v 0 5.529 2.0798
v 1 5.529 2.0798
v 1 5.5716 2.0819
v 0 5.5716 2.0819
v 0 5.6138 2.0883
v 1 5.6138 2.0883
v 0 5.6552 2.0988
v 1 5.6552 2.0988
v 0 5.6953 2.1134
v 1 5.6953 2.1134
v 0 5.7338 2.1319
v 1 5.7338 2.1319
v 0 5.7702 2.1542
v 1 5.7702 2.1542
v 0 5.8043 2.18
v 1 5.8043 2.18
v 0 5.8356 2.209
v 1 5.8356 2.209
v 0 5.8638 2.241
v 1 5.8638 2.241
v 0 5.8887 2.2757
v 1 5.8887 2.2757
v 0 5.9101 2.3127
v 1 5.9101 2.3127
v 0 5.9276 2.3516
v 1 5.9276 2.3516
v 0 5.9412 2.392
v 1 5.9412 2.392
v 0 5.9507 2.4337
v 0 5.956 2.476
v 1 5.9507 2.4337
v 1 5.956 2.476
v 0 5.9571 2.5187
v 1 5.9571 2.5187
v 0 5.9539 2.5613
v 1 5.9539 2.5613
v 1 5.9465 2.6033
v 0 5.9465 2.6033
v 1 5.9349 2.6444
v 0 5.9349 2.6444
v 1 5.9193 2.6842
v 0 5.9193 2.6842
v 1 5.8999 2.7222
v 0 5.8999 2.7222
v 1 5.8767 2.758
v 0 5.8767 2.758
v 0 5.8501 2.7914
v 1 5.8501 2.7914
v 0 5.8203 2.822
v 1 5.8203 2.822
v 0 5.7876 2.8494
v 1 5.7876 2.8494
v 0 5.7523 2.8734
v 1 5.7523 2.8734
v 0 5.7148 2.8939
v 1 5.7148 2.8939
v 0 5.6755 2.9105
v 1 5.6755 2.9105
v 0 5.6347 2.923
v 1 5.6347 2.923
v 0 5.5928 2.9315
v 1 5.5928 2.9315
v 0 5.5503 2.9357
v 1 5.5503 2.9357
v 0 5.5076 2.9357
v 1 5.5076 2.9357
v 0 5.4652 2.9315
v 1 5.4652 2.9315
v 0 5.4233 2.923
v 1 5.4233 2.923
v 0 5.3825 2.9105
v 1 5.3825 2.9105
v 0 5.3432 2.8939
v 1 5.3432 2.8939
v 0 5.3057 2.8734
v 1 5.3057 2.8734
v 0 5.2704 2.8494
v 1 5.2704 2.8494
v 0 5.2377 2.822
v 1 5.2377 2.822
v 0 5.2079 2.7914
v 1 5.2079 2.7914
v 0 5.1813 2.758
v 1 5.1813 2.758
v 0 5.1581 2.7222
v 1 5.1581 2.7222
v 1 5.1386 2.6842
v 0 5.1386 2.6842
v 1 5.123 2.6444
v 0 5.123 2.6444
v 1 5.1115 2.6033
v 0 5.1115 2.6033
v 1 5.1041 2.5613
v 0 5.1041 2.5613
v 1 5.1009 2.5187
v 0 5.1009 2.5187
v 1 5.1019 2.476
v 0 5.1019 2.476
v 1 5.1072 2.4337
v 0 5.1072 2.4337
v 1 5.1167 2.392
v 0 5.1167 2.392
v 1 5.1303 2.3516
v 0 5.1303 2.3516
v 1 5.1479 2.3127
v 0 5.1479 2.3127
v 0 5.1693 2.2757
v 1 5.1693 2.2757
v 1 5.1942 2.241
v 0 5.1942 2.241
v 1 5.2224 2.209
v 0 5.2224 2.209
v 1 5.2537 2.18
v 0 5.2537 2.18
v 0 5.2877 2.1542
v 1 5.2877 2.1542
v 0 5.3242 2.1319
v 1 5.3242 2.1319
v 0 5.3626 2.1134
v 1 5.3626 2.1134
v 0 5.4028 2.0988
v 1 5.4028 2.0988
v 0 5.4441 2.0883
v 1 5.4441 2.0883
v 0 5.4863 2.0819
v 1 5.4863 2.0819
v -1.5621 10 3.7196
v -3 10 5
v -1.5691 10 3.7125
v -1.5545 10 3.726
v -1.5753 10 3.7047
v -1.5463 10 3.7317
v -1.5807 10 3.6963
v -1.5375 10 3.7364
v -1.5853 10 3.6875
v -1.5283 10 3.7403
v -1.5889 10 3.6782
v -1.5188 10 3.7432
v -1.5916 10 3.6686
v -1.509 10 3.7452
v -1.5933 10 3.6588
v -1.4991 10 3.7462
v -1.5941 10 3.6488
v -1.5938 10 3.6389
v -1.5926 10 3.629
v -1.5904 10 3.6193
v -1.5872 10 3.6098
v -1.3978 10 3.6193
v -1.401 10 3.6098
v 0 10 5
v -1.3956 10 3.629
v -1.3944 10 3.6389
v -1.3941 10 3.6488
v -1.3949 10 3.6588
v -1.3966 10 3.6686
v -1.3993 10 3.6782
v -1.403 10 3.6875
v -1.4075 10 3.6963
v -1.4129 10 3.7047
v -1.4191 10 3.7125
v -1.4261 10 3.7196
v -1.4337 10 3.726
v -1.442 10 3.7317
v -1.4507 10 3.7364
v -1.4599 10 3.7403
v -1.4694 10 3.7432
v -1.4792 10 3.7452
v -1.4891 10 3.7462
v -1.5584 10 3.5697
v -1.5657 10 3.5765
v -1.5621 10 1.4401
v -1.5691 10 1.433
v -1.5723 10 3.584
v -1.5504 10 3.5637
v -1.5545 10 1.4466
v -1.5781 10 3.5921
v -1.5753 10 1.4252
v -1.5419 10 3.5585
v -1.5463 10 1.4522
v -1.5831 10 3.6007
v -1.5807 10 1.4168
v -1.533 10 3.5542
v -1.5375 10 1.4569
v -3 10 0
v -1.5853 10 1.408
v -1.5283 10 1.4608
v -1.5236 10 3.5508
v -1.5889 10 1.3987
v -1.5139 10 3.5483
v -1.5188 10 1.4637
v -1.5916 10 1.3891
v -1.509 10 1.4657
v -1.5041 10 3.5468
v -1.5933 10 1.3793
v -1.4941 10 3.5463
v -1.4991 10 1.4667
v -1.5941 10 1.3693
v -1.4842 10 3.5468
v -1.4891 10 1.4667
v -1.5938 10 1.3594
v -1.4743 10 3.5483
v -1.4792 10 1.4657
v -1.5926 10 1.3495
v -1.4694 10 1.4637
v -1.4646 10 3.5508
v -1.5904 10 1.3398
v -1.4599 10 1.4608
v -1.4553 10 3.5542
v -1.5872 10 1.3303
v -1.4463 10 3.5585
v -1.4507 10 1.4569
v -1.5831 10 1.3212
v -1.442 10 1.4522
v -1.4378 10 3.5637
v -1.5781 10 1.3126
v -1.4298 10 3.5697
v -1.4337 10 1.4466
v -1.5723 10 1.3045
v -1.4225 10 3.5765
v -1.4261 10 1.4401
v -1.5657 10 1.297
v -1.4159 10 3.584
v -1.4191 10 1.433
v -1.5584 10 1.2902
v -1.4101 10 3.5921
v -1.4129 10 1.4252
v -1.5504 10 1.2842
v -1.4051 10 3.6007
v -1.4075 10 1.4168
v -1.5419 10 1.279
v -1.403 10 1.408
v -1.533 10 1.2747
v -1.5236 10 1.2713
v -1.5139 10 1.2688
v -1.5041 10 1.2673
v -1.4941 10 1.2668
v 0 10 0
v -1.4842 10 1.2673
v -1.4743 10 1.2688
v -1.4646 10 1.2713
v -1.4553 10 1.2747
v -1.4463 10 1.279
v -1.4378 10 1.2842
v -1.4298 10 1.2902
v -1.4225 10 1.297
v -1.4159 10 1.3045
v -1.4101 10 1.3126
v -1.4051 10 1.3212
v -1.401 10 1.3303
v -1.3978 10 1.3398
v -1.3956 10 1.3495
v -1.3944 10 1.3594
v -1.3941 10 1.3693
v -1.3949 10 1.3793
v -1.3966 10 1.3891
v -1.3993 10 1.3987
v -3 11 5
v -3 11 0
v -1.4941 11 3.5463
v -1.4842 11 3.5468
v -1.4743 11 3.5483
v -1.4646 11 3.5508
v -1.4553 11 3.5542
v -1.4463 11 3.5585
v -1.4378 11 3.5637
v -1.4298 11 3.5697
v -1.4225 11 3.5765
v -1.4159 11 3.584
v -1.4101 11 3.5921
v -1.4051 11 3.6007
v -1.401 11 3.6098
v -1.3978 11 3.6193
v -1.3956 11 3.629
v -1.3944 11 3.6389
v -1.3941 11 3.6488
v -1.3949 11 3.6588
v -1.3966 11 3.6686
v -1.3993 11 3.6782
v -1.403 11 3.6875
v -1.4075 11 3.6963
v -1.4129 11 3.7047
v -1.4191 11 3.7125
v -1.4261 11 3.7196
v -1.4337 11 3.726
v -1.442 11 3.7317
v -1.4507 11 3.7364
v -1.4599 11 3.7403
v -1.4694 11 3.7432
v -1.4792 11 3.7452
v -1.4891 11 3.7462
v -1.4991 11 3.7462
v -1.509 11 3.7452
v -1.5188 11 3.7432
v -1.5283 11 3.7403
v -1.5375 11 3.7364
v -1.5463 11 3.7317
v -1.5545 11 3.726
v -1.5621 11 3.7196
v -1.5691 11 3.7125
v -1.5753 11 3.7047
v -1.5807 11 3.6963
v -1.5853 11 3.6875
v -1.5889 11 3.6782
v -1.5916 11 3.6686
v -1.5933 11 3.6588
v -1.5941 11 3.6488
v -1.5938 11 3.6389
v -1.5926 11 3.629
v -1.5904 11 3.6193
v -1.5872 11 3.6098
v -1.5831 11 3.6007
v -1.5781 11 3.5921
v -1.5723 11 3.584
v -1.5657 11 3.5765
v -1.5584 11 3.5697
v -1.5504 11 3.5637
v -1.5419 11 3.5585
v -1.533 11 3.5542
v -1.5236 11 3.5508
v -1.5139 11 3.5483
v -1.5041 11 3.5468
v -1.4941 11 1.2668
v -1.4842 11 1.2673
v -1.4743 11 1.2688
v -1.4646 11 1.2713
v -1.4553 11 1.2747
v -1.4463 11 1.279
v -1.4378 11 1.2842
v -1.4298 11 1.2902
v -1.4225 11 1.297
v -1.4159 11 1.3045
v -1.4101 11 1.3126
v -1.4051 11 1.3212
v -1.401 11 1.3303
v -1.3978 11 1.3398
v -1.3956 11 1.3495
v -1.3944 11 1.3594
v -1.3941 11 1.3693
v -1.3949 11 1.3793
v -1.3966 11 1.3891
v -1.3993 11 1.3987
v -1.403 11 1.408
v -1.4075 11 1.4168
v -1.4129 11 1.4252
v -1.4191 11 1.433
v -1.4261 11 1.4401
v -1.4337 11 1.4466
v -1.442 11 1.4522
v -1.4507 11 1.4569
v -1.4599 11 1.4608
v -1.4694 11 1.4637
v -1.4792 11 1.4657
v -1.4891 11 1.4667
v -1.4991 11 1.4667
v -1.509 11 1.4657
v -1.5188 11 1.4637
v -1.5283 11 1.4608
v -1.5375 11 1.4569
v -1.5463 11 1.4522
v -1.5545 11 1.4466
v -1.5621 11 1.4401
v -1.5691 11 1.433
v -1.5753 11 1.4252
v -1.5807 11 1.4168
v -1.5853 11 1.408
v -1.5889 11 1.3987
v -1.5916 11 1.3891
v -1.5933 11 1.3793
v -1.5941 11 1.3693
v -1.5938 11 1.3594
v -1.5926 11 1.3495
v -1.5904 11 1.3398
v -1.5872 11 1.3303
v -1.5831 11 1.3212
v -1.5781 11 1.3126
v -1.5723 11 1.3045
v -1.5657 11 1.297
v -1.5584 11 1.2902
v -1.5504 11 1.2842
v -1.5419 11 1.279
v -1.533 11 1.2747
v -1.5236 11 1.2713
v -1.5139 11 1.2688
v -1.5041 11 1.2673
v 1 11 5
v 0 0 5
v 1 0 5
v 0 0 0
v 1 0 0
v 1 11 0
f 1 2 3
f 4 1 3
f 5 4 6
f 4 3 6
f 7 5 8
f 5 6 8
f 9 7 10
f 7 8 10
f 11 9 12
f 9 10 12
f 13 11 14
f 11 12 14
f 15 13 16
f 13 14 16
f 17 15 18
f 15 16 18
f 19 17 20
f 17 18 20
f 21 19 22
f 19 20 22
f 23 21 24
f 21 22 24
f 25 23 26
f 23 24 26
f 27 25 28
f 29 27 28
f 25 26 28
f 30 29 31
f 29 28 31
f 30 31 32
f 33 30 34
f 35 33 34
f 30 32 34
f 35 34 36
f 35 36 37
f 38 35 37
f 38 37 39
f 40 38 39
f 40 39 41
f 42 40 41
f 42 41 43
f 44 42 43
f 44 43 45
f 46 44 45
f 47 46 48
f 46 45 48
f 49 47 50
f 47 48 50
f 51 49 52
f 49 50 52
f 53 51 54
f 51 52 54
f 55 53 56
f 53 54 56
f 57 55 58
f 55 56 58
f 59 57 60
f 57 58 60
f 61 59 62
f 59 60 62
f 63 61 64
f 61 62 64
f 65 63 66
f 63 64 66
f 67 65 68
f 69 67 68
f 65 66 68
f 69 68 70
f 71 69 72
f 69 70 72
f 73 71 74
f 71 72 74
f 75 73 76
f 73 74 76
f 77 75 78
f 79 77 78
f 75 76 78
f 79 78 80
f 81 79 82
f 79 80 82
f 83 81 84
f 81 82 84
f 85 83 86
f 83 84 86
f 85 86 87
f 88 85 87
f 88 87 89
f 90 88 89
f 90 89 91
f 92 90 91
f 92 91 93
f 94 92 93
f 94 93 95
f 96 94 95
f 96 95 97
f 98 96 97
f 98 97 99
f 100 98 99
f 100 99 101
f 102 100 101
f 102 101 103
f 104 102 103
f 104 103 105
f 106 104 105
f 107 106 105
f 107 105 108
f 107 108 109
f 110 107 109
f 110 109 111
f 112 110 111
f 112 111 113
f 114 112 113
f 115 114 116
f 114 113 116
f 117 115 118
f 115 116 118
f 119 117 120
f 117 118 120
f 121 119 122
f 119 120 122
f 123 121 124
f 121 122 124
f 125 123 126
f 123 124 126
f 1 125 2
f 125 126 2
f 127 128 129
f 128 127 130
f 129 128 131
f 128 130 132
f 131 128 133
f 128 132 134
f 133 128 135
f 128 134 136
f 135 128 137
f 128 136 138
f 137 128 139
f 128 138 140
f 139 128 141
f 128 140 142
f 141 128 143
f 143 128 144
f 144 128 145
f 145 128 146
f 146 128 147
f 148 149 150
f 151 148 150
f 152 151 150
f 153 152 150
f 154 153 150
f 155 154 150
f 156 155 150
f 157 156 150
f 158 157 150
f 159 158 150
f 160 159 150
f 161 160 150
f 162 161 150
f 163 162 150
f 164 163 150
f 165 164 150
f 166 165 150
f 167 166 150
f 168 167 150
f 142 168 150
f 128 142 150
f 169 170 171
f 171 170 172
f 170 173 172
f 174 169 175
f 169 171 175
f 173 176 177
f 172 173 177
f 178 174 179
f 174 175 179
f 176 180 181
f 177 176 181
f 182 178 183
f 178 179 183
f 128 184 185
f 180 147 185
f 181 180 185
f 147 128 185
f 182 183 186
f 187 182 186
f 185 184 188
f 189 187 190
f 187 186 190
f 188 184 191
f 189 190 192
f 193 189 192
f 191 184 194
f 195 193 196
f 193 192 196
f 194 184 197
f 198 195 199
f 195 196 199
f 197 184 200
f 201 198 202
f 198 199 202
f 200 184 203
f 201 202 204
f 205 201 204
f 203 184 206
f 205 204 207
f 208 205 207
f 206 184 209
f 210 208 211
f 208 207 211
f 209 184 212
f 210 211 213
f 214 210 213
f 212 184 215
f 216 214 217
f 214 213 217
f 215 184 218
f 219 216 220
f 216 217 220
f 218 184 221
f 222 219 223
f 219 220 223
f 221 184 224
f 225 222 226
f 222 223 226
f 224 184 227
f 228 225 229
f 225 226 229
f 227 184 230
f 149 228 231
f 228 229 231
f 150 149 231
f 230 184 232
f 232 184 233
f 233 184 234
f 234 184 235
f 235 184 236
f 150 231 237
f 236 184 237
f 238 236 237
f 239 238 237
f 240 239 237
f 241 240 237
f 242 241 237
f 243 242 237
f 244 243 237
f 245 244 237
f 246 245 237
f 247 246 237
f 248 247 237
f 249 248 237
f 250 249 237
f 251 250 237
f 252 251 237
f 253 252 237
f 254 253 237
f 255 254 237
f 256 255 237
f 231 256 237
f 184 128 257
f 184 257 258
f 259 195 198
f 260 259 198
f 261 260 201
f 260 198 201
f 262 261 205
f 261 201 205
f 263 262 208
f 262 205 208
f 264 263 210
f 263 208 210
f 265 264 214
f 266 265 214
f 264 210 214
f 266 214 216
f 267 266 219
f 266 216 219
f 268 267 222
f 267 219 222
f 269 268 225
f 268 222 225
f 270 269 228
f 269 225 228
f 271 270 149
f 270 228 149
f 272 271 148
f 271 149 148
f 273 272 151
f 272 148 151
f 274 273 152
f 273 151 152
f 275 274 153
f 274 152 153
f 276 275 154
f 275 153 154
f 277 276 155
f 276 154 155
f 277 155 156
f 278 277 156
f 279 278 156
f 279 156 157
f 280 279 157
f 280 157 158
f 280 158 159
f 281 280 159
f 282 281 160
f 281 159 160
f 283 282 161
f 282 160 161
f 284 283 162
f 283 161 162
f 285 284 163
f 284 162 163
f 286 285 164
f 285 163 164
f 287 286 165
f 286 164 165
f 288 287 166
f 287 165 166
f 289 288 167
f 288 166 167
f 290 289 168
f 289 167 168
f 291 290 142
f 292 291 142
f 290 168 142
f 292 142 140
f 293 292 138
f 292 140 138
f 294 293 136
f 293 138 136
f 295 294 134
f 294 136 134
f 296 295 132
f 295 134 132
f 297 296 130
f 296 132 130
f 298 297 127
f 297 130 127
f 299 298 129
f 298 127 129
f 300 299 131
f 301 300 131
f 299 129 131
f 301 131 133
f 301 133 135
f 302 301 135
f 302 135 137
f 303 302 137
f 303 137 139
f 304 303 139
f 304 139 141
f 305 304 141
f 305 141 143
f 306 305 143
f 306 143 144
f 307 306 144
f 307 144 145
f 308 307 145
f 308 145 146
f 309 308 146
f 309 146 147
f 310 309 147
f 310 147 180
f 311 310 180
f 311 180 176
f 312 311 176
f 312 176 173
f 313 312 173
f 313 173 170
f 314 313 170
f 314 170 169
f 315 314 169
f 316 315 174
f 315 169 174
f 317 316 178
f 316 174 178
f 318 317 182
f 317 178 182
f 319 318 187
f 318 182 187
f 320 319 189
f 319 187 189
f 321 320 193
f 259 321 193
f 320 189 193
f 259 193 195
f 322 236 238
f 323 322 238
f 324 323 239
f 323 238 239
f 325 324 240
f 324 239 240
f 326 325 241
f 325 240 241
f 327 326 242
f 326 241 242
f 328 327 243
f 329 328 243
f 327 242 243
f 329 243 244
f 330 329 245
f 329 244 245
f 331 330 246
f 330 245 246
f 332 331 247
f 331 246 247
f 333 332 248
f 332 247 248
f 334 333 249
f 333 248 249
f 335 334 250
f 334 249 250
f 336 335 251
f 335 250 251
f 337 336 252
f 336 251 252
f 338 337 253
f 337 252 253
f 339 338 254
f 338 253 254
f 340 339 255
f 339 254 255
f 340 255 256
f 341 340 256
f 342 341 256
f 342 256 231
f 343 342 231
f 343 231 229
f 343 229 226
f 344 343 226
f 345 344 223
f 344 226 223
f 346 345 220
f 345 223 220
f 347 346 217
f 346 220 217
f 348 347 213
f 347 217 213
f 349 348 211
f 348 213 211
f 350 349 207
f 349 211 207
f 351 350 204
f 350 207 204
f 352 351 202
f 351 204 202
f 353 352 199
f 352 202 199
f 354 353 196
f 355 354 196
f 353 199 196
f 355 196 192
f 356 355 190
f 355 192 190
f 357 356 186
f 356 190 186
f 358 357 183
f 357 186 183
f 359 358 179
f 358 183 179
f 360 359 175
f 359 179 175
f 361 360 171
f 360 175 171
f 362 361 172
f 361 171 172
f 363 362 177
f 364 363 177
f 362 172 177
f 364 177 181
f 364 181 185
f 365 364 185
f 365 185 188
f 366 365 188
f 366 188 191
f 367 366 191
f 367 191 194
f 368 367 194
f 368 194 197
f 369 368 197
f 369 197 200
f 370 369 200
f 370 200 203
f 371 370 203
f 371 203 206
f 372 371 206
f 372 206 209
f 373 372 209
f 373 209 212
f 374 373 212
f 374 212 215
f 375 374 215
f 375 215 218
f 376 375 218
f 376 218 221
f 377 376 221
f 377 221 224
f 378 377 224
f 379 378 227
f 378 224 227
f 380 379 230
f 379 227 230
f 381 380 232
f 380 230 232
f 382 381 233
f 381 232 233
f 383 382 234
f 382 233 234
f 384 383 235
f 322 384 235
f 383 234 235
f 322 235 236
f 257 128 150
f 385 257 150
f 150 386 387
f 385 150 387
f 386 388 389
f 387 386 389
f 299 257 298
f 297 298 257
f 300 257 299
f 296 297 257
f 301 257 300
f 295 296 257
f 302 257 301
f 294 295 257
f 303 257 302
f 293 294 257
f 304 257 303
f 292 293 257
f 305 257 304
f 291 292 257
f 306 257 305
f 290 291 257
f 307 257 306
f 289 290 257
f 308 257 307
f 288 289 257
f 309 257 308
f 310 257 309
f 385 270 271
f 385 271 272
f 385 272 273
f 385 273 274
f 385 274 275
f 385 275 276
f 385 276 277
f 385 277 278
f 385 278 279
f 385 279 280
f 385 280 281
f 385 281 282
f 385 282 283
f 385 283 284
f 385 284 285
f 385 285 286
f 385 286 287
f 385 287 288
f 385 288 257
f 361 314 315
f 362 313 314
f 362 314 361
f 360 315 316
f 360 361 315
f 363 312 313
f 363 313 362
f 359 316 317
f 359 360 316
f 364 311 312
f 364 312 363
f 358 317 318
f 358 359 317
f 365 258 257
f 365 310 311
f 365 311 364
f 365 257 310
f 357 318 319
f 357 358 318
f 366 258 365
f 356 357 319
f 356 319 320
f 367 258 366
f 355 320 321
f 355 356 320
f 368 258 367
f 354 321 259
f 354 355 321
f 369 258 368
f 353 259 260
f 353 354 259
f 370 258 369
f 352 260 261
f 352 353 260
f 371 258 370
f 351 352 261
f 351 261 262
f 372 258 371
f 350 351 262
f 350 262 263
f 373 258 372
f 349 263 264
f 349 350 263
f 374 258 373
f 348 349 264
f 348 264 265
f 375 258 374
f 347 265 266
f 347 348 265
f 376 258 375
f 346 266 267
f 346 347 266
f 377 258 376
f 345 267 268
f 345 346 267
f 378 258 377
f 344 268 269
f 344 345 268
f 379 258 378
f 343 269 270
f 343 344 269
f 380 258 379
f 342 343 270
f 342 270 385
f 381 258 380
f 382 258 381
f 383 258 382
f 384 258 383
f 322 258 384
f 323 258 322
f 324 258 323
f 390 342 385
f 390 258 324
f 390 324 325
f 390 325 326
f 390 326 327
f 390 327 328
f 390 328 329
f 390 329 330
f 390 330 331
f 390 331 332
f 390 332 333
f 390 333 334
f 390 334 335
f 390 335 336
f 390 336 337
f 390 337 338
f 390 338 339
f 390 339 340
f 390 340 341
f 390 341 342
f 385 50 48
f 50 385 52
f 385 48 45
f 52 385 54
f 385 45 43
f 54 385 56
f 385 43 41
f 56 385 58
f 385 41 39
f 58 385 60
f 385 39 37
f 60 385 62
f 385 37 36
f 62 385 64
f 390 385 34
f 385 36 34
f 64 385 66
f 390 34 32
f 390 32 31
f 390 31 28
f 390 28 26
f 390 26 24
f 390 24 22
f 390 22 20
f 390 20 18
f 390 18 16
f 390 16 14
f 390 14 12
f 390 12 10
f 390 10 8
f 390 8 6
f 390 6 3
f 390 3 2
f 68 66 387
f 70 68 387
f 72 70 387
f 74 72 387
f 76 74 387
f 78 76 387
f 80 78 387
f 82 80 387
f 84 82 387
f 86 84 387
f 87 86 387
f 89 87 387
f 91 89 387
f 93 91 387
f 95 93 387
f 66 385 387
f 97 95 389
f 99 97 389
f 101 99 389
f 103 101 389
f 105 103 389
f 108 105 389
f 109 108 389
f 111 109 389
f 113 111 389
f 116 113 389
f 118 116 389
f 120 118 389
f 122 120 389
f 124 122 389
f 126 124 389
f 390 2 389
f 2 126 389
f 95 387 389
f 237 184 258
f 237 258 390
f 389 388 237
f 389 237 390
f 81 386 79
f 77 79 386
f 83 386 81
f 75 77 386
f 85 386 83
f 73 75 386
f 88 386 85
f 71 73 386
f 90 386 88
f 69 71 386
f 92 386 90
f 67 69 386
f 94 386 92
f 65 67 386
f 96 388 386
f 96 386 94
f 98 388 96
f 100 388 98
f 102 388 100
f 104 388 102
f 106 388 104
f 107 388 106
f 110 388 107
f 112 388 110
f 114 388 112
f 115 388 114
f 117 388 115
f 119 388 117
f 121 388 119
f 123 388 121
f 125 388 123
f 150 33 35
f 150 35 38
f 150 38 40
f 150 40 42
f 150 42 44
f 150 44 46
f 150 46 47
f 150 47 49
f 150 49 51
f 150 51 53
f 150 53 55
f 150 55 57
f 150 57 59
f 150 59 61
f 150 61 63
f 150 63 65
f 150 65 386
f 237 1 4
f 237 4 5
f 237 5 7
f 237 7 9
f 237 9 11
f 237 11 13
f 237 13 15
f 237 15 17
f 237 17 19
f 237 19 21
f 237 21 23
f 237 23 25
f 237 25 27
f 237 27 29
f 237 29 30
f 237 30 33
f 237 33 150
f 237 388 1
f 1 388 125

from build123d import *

# Parameters (mm, degrees)
SKETCH1_W           = 1
SKETCH1_H           = 10
BOSS_EXTRUDE1_DEPTH = 5
SKETCH2_W           = 4
SKETCH2_H           = 5
BOSS_EXTRUDE2_DEPTH = 1
SKETCH3_R           = 0.428245062
CUT_EXTRUDE1_DEPTH  = 1
SKETCH4_R           = 0.1
CUT_EXTRUDE2_DEPTH  = 1


with BuildPart() as part:
    # Sketch1 → Boss-Extrude1 (new body)
    with BuildSketch(Plane.XY):
        with Locations((0.5, 5)):
            Rectangle(SKETCH1_W, SKETCH1_H)
    extrude(amount=BOSS_EXTRUDE1_DEPTH)

    # Sketch2 → Boss-Extrude2 (add)
    with BuildSketch(Plane(origin=(0, 10, 0), x_dir=(1, 0, 0), z_dir=(0, 1, 0))):
        with Locations((-1, -2.5)):
            Rectangle(SKETCH2_W, SKETCH2_H)
    extrude(amount=BOSS_EXTRUDE2_DEPTH)

    # Sketch3 → Cut-Extrude1 (cut)
    with BuildSketch(Plane(origin=(1, 0, 0), x_dir=(0, 0, -1), z_dir=(1, 0, 0))):
        with Locations((-2.508031341, 5.528987799)):
            Circle(SKETCH3_R)
    extrude(amount=-CUT_EXTRUDE1_DEPTH, mode=Mode.SUBTRACT)

    # Sketch4 → Cut-Extrude2 (cut)
    with BuildSketch(Plane(origin=(0, 10, 0), x_dir=(-1, 0, 0), z_dir=(0, -1, 0))):
        with Locations(Location((1.494110206, -1.366840593, 0), (0, 0, 90))):
            Circle(SKETCH4_R)
        with Locations(Location((1.494110206, -3.646335679, 0), (0, 0, 90))):
            Circle(SKETCH4_R)
    extrude(amount=-CUT_EXTRUDE2_DEPTH, mode=Mode.SUBTRACT)


solid = part.part
